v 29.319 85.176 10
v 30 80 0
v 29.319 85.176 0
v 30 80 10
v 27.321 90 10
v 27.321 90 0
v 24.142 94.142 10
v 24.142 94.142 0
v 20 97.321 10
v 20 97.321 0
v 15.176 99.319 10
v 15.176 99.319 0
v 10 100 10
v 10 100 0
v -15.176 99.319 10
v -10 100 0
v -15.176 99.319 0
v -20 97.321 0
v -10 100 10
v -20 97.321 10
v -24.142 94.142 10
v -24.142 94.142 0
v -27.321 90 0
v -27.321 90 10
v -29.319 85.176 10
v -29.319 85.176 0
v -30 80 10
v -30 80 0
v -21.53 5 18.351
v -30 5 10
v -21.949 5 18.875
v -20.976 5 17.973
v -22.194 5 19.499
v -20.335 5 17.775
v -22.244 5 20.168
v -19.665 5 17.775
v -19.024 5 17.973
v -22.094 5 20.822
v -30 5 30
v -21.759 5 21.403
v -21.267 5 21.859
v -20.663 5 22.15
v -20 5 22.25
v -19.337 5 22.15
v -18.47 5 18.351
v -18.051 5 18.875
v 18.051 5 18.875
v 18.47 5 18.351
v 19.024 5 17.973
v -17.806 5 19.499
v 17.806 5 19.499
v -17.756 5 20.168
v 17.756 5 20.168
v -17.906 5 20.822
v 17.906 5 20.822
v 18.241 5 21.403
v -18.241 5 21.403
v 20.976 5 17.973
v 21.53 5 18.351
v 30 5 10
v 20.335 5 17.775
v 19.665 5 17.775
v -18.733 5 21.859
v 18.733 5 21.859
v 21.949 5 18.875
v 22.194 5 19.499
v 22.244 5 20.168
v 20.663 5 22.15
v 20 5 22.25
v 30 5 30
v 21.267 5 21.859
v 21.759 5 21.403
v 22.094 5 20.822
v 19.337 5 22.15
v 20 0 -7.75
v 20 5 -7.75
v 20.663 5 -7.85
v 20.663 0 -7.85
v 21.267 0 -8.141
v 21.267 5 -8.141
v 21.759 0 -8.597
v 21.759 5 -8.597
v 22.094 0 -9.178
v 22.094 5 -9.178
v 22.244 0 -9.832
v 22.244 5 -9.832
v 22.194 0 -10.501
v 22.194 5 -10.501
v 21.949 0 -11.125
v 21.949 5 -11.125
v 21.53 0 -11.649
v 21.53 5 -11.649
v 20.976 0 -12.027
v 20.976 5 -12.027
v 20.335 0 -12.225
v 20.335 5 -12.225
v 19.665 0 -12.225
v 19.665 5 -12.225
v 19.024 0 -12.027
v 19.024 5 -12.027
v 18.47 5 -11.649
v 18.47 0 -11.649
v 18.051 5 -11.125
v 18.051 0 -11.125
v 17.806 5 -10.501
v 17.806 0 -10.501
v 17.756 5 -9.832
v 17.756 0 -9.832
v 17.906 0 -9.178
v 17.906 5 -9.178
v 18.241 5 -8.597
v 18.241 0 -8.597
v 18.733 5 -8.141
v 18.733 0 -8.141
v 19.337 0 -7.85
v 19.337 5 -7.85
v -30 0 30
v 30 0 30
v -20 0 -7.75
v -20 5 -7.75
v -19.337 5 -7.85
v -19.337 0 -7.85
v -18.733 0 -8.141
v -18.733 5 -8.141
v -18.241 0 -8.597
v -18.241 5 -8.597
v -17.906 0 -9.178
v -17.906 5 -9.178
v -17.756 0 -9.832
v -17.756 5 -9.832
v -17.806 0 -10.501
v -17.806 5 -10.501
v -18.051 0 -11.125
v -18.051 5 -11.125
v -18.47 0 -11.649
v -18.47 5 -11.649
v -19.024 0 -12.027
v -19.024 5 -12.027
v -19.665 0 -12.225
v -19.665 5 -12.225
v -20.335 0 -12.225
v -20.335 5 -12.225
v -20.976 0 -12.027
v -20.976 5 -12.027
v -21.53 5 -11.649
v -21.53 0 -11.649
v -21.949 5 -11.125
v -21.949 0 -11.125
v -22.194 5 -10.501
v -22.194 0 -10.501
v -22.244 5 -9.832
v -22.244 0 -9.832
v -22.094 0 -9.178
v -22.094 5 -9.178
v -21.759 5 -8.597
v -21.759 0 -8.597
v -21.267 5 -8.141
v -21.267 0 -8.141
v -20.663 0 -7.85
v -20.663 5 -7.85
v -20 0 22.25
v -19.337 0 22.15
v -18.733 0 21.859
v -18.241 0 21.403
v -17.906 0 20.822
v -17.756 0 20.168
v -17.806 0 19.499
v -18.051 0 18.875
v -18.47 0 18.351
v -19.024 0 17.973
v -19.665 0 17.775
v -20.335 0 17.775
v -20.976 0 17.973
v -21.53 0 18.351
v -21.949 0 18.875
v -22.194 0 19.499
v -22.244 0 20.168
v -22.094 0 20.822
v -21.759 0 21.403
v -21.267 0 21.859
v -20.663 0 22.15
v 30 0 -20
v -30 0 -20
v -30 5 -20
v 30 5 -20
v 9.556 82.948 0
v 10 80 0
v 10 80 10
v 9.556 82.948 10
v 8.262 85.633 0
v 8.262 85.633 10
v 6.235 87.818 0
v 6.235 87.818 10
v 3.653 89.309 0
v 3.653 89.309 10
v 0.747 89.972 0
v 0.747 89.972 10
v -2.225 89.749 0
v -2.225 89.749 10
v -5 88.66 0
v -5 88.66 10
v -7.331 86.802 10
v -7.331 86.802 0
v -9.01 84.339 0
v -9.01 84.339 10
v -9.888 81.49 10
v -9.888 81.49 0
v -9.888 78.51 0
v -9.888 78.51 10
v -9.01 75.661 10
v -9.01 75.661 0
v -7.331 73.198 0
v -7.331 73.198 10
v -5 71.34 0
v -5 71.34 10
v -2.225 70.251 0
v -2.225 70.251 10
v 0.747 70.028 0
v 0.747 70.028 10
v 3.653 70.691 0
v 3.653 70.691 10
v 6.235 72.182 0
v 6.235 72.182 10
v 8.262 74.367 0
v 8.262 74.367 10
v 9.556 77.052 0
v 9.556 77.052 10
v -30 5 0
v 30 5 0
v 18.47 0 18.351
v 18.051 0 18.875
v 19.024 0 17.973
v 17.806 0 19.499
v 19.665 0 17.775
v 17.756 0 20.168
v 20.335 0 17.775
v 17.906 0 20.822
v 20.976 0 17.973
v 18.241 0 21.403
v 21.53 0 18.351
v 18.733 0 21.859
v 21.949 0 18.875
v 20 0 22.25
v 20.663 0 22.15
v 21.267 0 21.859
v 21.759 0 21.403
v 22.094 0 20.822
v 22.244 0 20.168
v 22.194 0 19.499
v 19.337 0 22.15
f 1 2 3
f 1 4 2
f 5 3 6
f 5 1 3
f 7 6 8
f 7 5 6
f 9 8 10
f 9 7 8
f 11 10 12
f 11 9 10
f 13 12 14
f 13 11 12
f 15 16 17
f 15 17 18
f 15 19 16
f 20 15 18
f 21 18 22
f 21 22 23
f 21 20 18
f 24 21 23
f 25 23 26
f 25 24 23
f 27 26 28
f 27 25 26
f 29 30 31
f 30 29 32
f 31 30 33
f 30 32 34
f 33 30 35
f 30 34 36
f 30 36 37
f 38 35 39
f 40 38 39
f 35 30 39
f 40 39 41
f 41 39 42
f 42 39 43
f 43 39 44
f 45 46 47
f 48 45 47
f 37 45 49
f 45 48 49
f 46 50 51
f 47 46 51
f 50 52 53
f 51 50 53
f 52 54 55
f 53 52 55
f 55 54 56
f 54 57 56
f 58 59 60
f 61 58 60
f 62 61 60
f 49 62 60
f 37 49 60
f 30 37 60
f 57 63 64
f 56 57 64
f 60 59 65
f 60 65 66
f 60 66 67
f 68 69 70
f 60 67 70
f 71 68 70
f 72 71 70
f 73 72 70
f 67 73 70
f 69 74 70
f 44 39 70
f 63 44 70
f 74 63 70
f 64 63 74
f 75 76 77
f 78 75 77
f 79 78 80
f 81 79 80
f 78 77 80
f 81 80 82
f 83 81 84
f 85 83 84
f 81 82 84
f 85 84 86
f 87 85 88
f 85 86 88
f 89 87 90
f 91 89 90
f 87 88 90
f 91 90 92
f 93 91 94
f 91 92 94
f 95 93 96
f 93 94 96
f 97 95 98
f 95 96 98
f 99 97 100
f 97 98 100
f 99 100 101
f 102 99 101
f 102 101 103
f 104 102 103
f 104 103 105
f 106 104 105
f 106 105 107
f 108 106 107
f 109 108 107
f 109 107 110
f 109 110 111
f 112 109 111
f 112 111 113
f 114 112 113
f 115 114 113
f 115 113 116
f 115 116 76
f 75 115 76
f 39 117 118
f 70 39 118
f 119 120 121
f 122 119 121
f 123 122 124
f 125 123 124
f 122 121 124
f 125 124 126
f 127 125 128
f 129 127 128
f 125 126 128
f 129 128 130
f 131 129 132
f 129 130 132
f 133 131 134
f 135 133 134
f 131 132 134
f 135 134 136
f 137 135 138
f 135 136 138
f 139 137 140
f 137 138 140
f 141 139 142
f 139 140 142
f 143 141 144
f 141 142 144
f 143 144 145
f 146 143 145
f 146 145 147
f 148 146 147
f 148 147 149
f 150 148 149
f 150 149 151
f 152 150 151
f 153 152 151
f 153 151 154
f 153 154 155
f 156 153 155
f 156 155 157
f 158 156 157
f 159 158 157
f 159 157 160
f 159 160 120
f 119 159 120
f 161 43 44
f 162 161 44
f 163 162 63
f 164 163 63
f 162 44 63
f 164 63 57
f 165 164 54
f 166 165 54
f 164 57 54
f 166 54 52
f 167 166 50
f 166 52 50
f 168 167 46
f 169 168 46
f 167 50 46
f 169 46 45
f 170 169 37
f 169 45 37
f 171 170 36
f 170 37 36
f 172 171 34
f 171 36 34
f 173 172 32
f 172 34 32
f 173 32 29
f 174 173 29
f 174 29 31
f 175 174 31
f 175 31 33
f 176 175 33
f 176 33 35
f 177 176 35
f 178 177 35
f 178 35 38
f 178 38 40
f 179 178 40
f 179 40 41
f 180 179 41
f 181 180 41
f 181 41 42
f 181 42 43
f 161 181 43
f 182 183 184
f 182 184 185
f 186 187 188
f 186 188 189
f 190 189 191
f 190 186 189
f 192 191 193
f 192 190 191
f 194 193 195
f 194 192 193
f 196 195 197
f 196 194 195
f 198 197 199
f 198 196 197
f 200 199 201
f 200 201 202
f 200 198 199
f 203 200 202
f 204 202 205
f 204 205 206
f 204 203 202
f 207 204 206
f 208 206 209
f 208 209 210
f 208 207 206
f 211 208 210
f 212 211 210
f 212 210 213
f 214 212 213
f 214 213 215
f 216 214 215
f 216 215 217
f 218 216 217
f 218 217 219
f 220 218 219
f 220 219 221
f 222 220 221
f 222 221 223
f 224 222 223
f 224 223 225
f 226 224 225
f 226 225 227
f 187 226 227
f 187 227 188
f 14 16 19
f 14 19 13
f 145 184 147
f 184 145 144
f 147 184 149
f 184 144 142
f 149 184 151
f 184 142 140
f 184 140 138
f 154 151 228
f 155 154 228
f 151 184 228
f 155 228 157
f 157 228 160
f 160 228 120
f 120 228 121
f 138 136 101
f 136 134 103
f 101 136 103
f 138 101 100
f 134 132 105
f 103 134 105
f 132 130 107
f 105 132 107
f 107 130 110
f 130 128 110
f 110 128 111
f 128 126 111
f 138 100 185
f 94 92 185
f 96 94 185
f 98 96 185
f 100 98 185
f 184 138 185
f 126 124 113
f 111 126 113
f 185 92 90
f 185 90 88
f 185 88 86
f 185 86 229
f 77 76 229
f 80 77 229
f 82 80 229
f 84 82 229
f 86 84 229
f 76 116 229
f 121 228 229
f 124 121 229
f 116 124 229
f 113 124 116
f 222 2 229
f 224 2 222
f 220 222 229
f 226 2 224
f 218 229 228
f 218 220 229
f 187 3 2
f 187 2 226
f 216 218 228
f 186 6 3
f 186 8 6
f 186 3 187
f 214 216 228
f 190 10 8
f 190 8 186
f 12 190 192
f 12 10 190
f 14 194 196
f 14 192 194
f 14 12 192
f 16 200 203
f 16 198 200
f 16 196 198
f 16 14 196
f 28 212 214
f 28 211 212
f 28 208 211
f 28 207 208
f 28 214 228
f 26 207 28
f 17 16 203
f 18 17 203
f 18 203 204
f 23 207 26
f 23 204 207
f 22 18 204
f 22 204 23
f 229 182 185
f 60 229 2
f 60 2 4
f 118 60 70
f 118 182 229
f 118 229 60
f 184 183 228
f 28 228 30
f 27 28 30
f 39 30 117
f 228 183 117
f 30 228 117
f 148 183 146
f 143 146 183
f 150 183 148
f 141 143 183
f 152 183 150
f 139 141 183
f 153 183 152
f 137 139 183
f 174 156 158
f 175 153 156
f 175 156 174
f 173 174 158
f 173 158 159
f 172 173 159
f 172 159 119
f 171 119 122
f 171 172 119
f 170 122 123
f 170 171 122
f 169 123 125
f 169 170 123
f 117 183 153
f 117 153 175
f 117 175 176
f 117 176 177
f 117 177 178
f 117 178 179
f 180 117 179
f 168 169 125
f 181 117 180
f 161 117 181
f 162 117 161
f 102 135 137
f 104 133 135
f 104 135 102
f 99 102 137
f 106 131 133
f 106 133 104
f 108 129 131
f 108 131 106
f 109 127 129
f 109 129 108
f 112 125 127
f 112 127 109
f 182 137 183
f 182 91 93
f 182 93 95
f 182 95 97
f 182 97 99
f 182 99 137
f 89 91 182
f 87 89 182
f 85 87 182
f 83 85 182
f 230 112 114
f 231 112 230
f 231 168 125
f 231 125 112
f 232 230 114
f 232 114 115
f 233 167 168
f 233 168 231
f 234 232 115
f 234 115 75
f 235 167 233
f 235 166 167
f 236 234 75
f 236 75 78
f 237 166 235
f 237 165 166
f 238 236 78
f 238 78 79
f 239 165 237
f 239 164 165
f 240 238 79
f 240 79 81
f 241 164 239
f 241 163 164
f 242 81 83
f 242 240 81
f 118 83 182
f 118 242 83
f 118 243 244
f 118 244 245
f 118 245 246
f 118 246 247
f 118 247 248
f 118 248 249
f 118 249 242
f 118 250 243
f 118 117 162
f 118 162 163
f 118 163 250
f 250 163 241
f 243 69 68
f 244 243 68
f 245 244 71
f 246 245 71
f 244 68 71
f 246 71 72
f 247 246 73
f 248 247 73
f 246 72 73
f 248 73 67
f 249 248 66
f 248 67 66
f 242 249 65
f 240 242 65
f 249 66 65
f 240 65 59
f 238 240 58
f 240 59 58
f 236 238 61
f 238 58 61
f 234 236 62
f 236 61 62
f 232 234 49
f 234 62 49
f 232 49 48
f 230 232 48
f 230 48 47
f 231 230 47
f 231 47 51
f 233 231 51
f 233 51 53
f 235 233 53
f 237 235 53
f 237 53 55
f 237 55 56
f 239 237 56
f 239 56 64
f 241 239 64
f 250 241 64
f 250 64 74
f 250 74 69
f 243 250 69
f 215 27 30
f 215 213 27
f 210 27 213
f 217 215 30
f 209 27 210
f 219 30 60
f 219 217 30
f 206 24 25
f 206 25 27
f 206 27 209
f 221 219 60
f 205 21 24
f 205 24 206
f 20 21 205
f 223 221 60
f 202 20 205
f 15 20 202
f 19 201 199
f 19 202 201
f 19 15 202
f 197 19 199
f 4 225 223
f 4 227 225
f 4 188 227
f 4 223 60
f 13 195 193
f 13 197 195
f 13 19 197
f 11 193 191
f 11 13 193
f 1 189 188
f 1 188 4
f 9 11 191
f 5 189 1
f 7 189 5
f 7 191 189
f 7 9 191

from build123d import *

# Parameters (mm, degrees)
SKETCH_1_W          = 60
SKETCH_1_H          = 100
SKETCH_1_R          = 10
EXTRUDE_1_DEPTH     = 10
SKETCH_2_R          = 10
EXTRUDE_2_DEPTH     = 2
FILLET_1_R          = 20
SKETCH_3_W          = 60
SKETCH_3_H          = 50
EXTRUDE_3_DEPTH     = 5
SKETCH_4_R          = 2.25
CUT_EXTRUDE_1_DEPTH = 105.043260233
CUT_EXTRUDE_START   = -10
SKETCH_5_R          = 10
CUT_EXTRUDE_2_DEPTH = 10


with BuildPart() as part:
    # 草图1 → 凸台-拉伸1 (new body)
    with BuildSketch(Plane.XY):
        with Locations((0, 50)):
            Rectangle(SKETCH_1_W, SKETCH_1_H)
        with Locations((0, 80)):
            Circle(SKETCH_1_R, mode=Mode.SUBTRACT)
    extrude(amount=EXTRUDE_1_DEPTH)

    # 草图2 → 凸台-拉伸2 (add)
    with BuildSketch(Plane(origin=(0, 0, 0), x_dir=(-1, 0, 0), z_dir=(0, 0, -1))):
        with Locations((0, 80)):
            Circle(SKETCH_2_R)
    extrude(amount=-EXTRUDE_2_DEPTH)

    # 圆角1
    fillet_1_edges = [part.edges().sort_by_distance(p)[0] for p in [
        (-30, 100, 5),
        (30, 100, 5),
    ]]
    fillet(fillet_1_edges, radius=FILLET_1_R)

    # 草图3 → 凸台-拉伸3 (add)
    with BuildSketch(Plane.XZ):
        with Locations((0, 5)):
            Rectangle(SKETCH_3_W, SKETCH_3_H)
    extrude(amount=-EXTRUDE_3_DEPTH)

    # 草图4 → 切除-拉伸1 (cut, through all)
    with BuildSketch(Plane(origin=(0, 5, 0), x_dir=(1, 0, 0), z_dir=(0, 1, 0))):
        with Locations(Location((-20, 10, 0), (0, 0, 270))):
            Circle(SKETCH_4_R)
        with Locations(Location((20, 10, 0), (0, 0, 270))):
            Circle(SKETCH_4_R)
        with Locations(Location((-20, -20, 0), (0, 0, 270))):
            Circle(SKETCH_4_R)
        with Locations(Location((20, -20, 0), (0, 0, 270))):
            Circle(SKETCH_4_R)
    extrude(amount=-CUT_EXTRUDE_1_DEPTH, mode=Mode.SUBTRACT)

    # 草图5 → 切除-拉伸2 (cut)
    with BuildSketch(Plane.XY.offset(2).offset(CUT_EXTRUDE_START)):
        with Locations((0, 80)):
            Circle(SKETCH_5_R)
    extrude(amount=CUT_EXTRUDE_2_DEPTH, mode=Mode.SUBTRACT)


solid = part.part
